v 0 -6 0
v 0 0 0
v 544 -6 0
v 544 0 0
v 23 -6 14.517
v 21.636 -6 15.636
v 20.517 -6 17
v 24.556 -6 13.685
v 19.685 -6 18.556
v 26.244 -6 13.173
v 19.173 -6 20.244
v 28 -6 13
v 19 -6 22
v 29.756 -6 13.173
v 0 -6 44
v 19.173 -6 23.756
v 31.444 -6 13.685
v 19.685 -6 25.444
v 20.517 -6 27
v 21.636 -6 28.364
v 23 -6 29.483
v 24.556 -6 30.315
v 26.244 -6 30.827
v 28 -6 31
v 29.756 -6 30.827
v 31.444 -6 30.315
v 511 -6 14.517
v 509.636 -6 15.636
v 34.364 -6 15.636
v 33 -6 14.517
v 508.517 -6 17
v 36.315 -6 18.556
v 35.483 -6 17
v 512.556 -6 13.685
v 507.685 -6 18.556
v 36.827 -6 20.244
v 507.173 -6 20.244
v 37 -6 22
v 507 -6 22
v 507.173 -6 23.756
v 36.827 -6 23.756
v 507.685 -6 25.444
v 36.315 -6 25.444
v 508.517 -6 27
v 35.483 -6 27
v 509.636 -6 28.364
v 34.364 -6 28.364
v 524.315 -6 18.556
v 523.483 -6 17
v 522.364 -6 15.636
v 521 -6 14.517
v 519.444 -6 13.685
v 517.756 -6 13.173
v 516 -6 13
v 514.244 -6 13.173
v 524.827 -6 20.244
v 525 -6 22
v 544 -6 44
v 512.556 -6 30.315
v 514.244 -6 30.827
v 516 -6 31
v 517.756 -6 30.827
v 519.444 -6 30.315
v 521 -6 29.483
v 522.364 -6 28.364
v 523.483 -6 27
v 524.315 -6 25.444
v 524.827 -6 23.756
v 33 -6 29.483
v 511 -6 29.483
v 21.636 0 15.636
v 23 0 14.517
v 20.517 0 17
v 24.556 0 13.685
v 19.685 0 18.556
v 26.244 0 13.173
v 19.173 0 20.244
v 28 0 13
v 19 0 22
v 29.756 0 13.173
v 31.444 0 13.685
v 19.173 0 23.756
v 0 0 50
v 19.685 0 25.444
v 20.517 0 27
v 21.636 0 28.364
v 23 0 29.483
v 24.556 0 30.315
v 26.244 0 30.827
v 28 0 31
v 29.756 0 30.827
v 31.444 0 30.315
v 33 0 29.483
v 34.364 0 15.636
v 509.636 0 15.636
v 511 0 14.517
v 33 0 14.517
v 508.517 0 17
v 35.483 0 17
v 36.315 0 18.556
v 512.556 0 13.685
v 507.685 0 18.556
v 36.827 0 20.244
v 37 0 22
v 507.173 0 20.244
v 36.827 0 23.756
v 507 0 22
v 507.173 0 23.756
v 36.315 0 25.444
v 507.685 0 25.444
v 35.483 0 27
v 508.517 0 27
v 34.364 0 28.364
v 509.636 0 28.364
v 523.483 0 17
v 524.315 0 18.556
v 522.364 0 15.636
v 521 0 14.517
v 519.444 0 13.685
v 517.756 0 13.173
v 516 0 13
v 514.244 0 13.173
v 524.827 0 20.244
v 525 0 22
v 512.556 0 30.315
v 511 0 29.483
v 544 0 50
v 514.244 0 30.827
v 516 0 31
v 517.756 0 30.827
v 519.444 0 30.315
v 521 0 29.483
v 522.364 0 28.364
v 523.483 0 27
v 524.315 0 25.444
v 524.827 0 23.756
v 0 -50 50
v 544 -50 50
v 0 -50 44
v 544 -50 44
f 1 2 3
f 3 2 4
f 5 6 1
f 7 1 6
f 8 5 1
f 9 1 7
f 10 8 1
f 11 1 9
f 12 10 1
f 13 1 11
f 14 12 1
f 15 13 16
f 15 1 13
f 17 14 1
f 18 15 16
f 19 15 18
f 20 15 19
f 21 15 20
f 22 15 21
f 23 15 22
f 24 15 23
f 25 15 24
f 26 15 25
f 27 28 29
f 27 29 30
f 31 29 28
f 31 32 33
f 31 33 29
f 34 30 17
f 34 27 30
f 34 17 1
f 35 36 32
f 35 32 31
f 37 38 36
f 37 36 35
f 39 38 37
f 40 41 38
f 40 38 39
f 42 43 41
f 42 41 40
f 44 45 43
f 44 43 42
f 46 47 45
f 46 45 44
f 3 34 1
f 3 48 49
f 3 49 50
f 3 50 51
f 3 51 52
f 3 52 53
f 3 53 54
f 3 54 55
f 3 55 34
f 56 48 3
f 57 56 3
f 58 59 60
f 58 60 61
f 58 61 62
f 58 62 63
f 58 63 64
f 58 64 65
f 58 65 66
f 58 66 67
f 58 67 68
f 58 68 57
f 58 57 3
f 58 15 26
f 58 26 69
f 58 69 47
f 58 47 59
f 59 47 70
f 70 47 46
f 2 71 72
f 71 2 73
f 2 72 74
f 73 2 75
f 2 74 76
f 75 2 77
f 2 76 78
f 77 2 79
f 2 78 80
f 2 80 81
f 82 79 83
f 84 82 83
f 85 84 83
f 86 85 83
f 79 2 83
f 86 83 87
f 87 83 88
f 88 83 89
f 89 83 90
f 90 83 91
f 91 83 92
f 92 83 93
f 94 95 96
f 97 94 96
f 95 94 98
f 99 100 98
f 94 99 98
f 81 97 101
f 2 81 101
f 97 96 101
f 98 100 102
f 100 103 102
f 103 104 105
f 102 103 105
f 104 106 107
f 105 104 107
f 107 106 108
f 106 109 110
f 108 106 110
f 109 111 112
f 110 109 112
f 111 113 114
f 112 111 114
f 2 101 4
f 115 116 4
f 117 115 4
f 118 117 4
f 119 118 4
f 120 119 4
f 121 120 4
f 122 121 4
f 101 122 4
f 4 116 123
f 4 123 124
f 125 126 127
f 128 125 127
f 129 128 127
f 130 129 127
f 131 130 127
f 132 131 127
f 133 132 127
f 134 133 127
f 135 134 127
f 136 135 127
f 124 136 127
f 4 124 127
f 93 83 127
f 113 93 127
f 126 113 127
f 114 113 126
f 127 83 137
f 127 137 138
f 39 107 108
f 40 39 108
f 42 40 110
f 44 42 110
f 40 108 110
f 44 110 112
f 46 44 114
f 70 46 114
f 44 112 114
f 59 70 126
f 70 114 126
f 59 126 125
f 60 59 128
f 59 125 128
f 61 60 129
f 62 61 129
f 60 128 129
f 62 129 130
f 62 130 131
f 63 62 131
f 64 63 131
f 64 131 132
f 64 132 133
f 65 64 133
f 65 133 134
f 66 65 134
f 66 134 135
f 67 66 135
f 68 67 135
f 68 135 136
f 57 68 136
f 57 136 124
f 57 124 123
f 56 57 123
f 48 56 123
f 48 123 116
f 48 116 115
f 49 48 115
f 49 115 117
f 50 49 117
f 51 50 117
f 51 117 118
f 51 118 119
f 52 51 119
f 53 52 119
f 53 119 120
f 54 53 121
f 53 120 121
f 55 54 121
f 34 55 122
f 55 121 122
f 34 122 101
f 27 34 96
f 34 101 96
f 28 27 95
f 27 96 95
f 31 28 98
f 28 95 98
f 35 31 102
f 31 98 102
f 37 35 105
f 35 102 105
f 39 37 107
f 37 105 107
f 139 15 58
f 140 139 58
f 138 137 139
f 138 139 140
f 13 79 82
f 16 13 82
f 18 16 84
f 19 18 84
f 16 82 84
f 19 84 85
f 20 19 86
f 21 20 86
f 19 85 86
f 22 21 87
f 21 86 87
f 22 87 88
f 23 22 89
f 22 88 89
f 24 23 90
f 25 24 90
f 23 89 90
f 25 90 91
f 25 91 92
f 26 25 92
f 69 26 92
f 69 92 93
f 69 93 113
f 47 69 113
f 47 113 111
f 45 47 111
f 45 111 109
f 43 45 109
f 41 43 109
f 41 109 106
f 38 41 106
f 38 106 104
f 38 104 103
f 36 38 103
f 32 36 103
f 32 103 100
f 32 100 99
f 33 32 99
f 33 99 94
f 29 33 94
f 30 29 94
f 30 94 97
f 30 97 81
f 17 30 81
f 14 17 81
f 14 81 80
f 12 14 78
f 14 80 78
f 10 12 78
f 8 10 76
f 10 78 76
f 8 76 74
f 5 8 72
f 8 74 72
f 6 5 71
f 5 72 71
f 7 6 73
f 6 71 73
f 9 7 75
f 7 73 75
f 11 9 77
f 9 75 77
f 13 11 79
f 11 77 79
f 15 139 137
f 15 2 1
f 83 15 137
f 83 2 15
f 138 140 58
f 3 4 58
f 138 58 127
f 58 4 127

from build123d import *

# Parameters (mm, degrees)
F0_W     = 544
F0_H     = 50
F1_DEPTH = 6
F2_W     = 544
F2_H     = 6
F3_DEPTH = 44
F4_R     = 9
F5_DEPTH = 25


with BuildPart() as f1:
    # F0 (on Front) → F1 (new body)
    with BuildSketch(Plane.XZ):
        with Locations((272, 25)):
            Rectangle(F0_W, F0_H)
    extrude(amount=F1_DEPTH)

    # F2 (on face) → F3 (join)
    with BuildSketch(Plane.XZ.offset(6)):
        with Locations((272, 47)):
            Rectangle(F2_W, F2_H)
    extrude(amount=F3_DEPTH)

    # F4 (on face) → F5 (cut)
    with BuildSketch(Plane(origin=(0, 0, 0), x_dir=(-1, 0, 0), z_dir=(0, 1, 0))):
        with Locations((-516, 22)):
            Circle(F4_R)
        with Locations((-28, 22)):
            Circle(F4_R)
    extrude(amount=-F5_DEPTH, mode=Mode.SUBTRACT)


solid = f1.part
